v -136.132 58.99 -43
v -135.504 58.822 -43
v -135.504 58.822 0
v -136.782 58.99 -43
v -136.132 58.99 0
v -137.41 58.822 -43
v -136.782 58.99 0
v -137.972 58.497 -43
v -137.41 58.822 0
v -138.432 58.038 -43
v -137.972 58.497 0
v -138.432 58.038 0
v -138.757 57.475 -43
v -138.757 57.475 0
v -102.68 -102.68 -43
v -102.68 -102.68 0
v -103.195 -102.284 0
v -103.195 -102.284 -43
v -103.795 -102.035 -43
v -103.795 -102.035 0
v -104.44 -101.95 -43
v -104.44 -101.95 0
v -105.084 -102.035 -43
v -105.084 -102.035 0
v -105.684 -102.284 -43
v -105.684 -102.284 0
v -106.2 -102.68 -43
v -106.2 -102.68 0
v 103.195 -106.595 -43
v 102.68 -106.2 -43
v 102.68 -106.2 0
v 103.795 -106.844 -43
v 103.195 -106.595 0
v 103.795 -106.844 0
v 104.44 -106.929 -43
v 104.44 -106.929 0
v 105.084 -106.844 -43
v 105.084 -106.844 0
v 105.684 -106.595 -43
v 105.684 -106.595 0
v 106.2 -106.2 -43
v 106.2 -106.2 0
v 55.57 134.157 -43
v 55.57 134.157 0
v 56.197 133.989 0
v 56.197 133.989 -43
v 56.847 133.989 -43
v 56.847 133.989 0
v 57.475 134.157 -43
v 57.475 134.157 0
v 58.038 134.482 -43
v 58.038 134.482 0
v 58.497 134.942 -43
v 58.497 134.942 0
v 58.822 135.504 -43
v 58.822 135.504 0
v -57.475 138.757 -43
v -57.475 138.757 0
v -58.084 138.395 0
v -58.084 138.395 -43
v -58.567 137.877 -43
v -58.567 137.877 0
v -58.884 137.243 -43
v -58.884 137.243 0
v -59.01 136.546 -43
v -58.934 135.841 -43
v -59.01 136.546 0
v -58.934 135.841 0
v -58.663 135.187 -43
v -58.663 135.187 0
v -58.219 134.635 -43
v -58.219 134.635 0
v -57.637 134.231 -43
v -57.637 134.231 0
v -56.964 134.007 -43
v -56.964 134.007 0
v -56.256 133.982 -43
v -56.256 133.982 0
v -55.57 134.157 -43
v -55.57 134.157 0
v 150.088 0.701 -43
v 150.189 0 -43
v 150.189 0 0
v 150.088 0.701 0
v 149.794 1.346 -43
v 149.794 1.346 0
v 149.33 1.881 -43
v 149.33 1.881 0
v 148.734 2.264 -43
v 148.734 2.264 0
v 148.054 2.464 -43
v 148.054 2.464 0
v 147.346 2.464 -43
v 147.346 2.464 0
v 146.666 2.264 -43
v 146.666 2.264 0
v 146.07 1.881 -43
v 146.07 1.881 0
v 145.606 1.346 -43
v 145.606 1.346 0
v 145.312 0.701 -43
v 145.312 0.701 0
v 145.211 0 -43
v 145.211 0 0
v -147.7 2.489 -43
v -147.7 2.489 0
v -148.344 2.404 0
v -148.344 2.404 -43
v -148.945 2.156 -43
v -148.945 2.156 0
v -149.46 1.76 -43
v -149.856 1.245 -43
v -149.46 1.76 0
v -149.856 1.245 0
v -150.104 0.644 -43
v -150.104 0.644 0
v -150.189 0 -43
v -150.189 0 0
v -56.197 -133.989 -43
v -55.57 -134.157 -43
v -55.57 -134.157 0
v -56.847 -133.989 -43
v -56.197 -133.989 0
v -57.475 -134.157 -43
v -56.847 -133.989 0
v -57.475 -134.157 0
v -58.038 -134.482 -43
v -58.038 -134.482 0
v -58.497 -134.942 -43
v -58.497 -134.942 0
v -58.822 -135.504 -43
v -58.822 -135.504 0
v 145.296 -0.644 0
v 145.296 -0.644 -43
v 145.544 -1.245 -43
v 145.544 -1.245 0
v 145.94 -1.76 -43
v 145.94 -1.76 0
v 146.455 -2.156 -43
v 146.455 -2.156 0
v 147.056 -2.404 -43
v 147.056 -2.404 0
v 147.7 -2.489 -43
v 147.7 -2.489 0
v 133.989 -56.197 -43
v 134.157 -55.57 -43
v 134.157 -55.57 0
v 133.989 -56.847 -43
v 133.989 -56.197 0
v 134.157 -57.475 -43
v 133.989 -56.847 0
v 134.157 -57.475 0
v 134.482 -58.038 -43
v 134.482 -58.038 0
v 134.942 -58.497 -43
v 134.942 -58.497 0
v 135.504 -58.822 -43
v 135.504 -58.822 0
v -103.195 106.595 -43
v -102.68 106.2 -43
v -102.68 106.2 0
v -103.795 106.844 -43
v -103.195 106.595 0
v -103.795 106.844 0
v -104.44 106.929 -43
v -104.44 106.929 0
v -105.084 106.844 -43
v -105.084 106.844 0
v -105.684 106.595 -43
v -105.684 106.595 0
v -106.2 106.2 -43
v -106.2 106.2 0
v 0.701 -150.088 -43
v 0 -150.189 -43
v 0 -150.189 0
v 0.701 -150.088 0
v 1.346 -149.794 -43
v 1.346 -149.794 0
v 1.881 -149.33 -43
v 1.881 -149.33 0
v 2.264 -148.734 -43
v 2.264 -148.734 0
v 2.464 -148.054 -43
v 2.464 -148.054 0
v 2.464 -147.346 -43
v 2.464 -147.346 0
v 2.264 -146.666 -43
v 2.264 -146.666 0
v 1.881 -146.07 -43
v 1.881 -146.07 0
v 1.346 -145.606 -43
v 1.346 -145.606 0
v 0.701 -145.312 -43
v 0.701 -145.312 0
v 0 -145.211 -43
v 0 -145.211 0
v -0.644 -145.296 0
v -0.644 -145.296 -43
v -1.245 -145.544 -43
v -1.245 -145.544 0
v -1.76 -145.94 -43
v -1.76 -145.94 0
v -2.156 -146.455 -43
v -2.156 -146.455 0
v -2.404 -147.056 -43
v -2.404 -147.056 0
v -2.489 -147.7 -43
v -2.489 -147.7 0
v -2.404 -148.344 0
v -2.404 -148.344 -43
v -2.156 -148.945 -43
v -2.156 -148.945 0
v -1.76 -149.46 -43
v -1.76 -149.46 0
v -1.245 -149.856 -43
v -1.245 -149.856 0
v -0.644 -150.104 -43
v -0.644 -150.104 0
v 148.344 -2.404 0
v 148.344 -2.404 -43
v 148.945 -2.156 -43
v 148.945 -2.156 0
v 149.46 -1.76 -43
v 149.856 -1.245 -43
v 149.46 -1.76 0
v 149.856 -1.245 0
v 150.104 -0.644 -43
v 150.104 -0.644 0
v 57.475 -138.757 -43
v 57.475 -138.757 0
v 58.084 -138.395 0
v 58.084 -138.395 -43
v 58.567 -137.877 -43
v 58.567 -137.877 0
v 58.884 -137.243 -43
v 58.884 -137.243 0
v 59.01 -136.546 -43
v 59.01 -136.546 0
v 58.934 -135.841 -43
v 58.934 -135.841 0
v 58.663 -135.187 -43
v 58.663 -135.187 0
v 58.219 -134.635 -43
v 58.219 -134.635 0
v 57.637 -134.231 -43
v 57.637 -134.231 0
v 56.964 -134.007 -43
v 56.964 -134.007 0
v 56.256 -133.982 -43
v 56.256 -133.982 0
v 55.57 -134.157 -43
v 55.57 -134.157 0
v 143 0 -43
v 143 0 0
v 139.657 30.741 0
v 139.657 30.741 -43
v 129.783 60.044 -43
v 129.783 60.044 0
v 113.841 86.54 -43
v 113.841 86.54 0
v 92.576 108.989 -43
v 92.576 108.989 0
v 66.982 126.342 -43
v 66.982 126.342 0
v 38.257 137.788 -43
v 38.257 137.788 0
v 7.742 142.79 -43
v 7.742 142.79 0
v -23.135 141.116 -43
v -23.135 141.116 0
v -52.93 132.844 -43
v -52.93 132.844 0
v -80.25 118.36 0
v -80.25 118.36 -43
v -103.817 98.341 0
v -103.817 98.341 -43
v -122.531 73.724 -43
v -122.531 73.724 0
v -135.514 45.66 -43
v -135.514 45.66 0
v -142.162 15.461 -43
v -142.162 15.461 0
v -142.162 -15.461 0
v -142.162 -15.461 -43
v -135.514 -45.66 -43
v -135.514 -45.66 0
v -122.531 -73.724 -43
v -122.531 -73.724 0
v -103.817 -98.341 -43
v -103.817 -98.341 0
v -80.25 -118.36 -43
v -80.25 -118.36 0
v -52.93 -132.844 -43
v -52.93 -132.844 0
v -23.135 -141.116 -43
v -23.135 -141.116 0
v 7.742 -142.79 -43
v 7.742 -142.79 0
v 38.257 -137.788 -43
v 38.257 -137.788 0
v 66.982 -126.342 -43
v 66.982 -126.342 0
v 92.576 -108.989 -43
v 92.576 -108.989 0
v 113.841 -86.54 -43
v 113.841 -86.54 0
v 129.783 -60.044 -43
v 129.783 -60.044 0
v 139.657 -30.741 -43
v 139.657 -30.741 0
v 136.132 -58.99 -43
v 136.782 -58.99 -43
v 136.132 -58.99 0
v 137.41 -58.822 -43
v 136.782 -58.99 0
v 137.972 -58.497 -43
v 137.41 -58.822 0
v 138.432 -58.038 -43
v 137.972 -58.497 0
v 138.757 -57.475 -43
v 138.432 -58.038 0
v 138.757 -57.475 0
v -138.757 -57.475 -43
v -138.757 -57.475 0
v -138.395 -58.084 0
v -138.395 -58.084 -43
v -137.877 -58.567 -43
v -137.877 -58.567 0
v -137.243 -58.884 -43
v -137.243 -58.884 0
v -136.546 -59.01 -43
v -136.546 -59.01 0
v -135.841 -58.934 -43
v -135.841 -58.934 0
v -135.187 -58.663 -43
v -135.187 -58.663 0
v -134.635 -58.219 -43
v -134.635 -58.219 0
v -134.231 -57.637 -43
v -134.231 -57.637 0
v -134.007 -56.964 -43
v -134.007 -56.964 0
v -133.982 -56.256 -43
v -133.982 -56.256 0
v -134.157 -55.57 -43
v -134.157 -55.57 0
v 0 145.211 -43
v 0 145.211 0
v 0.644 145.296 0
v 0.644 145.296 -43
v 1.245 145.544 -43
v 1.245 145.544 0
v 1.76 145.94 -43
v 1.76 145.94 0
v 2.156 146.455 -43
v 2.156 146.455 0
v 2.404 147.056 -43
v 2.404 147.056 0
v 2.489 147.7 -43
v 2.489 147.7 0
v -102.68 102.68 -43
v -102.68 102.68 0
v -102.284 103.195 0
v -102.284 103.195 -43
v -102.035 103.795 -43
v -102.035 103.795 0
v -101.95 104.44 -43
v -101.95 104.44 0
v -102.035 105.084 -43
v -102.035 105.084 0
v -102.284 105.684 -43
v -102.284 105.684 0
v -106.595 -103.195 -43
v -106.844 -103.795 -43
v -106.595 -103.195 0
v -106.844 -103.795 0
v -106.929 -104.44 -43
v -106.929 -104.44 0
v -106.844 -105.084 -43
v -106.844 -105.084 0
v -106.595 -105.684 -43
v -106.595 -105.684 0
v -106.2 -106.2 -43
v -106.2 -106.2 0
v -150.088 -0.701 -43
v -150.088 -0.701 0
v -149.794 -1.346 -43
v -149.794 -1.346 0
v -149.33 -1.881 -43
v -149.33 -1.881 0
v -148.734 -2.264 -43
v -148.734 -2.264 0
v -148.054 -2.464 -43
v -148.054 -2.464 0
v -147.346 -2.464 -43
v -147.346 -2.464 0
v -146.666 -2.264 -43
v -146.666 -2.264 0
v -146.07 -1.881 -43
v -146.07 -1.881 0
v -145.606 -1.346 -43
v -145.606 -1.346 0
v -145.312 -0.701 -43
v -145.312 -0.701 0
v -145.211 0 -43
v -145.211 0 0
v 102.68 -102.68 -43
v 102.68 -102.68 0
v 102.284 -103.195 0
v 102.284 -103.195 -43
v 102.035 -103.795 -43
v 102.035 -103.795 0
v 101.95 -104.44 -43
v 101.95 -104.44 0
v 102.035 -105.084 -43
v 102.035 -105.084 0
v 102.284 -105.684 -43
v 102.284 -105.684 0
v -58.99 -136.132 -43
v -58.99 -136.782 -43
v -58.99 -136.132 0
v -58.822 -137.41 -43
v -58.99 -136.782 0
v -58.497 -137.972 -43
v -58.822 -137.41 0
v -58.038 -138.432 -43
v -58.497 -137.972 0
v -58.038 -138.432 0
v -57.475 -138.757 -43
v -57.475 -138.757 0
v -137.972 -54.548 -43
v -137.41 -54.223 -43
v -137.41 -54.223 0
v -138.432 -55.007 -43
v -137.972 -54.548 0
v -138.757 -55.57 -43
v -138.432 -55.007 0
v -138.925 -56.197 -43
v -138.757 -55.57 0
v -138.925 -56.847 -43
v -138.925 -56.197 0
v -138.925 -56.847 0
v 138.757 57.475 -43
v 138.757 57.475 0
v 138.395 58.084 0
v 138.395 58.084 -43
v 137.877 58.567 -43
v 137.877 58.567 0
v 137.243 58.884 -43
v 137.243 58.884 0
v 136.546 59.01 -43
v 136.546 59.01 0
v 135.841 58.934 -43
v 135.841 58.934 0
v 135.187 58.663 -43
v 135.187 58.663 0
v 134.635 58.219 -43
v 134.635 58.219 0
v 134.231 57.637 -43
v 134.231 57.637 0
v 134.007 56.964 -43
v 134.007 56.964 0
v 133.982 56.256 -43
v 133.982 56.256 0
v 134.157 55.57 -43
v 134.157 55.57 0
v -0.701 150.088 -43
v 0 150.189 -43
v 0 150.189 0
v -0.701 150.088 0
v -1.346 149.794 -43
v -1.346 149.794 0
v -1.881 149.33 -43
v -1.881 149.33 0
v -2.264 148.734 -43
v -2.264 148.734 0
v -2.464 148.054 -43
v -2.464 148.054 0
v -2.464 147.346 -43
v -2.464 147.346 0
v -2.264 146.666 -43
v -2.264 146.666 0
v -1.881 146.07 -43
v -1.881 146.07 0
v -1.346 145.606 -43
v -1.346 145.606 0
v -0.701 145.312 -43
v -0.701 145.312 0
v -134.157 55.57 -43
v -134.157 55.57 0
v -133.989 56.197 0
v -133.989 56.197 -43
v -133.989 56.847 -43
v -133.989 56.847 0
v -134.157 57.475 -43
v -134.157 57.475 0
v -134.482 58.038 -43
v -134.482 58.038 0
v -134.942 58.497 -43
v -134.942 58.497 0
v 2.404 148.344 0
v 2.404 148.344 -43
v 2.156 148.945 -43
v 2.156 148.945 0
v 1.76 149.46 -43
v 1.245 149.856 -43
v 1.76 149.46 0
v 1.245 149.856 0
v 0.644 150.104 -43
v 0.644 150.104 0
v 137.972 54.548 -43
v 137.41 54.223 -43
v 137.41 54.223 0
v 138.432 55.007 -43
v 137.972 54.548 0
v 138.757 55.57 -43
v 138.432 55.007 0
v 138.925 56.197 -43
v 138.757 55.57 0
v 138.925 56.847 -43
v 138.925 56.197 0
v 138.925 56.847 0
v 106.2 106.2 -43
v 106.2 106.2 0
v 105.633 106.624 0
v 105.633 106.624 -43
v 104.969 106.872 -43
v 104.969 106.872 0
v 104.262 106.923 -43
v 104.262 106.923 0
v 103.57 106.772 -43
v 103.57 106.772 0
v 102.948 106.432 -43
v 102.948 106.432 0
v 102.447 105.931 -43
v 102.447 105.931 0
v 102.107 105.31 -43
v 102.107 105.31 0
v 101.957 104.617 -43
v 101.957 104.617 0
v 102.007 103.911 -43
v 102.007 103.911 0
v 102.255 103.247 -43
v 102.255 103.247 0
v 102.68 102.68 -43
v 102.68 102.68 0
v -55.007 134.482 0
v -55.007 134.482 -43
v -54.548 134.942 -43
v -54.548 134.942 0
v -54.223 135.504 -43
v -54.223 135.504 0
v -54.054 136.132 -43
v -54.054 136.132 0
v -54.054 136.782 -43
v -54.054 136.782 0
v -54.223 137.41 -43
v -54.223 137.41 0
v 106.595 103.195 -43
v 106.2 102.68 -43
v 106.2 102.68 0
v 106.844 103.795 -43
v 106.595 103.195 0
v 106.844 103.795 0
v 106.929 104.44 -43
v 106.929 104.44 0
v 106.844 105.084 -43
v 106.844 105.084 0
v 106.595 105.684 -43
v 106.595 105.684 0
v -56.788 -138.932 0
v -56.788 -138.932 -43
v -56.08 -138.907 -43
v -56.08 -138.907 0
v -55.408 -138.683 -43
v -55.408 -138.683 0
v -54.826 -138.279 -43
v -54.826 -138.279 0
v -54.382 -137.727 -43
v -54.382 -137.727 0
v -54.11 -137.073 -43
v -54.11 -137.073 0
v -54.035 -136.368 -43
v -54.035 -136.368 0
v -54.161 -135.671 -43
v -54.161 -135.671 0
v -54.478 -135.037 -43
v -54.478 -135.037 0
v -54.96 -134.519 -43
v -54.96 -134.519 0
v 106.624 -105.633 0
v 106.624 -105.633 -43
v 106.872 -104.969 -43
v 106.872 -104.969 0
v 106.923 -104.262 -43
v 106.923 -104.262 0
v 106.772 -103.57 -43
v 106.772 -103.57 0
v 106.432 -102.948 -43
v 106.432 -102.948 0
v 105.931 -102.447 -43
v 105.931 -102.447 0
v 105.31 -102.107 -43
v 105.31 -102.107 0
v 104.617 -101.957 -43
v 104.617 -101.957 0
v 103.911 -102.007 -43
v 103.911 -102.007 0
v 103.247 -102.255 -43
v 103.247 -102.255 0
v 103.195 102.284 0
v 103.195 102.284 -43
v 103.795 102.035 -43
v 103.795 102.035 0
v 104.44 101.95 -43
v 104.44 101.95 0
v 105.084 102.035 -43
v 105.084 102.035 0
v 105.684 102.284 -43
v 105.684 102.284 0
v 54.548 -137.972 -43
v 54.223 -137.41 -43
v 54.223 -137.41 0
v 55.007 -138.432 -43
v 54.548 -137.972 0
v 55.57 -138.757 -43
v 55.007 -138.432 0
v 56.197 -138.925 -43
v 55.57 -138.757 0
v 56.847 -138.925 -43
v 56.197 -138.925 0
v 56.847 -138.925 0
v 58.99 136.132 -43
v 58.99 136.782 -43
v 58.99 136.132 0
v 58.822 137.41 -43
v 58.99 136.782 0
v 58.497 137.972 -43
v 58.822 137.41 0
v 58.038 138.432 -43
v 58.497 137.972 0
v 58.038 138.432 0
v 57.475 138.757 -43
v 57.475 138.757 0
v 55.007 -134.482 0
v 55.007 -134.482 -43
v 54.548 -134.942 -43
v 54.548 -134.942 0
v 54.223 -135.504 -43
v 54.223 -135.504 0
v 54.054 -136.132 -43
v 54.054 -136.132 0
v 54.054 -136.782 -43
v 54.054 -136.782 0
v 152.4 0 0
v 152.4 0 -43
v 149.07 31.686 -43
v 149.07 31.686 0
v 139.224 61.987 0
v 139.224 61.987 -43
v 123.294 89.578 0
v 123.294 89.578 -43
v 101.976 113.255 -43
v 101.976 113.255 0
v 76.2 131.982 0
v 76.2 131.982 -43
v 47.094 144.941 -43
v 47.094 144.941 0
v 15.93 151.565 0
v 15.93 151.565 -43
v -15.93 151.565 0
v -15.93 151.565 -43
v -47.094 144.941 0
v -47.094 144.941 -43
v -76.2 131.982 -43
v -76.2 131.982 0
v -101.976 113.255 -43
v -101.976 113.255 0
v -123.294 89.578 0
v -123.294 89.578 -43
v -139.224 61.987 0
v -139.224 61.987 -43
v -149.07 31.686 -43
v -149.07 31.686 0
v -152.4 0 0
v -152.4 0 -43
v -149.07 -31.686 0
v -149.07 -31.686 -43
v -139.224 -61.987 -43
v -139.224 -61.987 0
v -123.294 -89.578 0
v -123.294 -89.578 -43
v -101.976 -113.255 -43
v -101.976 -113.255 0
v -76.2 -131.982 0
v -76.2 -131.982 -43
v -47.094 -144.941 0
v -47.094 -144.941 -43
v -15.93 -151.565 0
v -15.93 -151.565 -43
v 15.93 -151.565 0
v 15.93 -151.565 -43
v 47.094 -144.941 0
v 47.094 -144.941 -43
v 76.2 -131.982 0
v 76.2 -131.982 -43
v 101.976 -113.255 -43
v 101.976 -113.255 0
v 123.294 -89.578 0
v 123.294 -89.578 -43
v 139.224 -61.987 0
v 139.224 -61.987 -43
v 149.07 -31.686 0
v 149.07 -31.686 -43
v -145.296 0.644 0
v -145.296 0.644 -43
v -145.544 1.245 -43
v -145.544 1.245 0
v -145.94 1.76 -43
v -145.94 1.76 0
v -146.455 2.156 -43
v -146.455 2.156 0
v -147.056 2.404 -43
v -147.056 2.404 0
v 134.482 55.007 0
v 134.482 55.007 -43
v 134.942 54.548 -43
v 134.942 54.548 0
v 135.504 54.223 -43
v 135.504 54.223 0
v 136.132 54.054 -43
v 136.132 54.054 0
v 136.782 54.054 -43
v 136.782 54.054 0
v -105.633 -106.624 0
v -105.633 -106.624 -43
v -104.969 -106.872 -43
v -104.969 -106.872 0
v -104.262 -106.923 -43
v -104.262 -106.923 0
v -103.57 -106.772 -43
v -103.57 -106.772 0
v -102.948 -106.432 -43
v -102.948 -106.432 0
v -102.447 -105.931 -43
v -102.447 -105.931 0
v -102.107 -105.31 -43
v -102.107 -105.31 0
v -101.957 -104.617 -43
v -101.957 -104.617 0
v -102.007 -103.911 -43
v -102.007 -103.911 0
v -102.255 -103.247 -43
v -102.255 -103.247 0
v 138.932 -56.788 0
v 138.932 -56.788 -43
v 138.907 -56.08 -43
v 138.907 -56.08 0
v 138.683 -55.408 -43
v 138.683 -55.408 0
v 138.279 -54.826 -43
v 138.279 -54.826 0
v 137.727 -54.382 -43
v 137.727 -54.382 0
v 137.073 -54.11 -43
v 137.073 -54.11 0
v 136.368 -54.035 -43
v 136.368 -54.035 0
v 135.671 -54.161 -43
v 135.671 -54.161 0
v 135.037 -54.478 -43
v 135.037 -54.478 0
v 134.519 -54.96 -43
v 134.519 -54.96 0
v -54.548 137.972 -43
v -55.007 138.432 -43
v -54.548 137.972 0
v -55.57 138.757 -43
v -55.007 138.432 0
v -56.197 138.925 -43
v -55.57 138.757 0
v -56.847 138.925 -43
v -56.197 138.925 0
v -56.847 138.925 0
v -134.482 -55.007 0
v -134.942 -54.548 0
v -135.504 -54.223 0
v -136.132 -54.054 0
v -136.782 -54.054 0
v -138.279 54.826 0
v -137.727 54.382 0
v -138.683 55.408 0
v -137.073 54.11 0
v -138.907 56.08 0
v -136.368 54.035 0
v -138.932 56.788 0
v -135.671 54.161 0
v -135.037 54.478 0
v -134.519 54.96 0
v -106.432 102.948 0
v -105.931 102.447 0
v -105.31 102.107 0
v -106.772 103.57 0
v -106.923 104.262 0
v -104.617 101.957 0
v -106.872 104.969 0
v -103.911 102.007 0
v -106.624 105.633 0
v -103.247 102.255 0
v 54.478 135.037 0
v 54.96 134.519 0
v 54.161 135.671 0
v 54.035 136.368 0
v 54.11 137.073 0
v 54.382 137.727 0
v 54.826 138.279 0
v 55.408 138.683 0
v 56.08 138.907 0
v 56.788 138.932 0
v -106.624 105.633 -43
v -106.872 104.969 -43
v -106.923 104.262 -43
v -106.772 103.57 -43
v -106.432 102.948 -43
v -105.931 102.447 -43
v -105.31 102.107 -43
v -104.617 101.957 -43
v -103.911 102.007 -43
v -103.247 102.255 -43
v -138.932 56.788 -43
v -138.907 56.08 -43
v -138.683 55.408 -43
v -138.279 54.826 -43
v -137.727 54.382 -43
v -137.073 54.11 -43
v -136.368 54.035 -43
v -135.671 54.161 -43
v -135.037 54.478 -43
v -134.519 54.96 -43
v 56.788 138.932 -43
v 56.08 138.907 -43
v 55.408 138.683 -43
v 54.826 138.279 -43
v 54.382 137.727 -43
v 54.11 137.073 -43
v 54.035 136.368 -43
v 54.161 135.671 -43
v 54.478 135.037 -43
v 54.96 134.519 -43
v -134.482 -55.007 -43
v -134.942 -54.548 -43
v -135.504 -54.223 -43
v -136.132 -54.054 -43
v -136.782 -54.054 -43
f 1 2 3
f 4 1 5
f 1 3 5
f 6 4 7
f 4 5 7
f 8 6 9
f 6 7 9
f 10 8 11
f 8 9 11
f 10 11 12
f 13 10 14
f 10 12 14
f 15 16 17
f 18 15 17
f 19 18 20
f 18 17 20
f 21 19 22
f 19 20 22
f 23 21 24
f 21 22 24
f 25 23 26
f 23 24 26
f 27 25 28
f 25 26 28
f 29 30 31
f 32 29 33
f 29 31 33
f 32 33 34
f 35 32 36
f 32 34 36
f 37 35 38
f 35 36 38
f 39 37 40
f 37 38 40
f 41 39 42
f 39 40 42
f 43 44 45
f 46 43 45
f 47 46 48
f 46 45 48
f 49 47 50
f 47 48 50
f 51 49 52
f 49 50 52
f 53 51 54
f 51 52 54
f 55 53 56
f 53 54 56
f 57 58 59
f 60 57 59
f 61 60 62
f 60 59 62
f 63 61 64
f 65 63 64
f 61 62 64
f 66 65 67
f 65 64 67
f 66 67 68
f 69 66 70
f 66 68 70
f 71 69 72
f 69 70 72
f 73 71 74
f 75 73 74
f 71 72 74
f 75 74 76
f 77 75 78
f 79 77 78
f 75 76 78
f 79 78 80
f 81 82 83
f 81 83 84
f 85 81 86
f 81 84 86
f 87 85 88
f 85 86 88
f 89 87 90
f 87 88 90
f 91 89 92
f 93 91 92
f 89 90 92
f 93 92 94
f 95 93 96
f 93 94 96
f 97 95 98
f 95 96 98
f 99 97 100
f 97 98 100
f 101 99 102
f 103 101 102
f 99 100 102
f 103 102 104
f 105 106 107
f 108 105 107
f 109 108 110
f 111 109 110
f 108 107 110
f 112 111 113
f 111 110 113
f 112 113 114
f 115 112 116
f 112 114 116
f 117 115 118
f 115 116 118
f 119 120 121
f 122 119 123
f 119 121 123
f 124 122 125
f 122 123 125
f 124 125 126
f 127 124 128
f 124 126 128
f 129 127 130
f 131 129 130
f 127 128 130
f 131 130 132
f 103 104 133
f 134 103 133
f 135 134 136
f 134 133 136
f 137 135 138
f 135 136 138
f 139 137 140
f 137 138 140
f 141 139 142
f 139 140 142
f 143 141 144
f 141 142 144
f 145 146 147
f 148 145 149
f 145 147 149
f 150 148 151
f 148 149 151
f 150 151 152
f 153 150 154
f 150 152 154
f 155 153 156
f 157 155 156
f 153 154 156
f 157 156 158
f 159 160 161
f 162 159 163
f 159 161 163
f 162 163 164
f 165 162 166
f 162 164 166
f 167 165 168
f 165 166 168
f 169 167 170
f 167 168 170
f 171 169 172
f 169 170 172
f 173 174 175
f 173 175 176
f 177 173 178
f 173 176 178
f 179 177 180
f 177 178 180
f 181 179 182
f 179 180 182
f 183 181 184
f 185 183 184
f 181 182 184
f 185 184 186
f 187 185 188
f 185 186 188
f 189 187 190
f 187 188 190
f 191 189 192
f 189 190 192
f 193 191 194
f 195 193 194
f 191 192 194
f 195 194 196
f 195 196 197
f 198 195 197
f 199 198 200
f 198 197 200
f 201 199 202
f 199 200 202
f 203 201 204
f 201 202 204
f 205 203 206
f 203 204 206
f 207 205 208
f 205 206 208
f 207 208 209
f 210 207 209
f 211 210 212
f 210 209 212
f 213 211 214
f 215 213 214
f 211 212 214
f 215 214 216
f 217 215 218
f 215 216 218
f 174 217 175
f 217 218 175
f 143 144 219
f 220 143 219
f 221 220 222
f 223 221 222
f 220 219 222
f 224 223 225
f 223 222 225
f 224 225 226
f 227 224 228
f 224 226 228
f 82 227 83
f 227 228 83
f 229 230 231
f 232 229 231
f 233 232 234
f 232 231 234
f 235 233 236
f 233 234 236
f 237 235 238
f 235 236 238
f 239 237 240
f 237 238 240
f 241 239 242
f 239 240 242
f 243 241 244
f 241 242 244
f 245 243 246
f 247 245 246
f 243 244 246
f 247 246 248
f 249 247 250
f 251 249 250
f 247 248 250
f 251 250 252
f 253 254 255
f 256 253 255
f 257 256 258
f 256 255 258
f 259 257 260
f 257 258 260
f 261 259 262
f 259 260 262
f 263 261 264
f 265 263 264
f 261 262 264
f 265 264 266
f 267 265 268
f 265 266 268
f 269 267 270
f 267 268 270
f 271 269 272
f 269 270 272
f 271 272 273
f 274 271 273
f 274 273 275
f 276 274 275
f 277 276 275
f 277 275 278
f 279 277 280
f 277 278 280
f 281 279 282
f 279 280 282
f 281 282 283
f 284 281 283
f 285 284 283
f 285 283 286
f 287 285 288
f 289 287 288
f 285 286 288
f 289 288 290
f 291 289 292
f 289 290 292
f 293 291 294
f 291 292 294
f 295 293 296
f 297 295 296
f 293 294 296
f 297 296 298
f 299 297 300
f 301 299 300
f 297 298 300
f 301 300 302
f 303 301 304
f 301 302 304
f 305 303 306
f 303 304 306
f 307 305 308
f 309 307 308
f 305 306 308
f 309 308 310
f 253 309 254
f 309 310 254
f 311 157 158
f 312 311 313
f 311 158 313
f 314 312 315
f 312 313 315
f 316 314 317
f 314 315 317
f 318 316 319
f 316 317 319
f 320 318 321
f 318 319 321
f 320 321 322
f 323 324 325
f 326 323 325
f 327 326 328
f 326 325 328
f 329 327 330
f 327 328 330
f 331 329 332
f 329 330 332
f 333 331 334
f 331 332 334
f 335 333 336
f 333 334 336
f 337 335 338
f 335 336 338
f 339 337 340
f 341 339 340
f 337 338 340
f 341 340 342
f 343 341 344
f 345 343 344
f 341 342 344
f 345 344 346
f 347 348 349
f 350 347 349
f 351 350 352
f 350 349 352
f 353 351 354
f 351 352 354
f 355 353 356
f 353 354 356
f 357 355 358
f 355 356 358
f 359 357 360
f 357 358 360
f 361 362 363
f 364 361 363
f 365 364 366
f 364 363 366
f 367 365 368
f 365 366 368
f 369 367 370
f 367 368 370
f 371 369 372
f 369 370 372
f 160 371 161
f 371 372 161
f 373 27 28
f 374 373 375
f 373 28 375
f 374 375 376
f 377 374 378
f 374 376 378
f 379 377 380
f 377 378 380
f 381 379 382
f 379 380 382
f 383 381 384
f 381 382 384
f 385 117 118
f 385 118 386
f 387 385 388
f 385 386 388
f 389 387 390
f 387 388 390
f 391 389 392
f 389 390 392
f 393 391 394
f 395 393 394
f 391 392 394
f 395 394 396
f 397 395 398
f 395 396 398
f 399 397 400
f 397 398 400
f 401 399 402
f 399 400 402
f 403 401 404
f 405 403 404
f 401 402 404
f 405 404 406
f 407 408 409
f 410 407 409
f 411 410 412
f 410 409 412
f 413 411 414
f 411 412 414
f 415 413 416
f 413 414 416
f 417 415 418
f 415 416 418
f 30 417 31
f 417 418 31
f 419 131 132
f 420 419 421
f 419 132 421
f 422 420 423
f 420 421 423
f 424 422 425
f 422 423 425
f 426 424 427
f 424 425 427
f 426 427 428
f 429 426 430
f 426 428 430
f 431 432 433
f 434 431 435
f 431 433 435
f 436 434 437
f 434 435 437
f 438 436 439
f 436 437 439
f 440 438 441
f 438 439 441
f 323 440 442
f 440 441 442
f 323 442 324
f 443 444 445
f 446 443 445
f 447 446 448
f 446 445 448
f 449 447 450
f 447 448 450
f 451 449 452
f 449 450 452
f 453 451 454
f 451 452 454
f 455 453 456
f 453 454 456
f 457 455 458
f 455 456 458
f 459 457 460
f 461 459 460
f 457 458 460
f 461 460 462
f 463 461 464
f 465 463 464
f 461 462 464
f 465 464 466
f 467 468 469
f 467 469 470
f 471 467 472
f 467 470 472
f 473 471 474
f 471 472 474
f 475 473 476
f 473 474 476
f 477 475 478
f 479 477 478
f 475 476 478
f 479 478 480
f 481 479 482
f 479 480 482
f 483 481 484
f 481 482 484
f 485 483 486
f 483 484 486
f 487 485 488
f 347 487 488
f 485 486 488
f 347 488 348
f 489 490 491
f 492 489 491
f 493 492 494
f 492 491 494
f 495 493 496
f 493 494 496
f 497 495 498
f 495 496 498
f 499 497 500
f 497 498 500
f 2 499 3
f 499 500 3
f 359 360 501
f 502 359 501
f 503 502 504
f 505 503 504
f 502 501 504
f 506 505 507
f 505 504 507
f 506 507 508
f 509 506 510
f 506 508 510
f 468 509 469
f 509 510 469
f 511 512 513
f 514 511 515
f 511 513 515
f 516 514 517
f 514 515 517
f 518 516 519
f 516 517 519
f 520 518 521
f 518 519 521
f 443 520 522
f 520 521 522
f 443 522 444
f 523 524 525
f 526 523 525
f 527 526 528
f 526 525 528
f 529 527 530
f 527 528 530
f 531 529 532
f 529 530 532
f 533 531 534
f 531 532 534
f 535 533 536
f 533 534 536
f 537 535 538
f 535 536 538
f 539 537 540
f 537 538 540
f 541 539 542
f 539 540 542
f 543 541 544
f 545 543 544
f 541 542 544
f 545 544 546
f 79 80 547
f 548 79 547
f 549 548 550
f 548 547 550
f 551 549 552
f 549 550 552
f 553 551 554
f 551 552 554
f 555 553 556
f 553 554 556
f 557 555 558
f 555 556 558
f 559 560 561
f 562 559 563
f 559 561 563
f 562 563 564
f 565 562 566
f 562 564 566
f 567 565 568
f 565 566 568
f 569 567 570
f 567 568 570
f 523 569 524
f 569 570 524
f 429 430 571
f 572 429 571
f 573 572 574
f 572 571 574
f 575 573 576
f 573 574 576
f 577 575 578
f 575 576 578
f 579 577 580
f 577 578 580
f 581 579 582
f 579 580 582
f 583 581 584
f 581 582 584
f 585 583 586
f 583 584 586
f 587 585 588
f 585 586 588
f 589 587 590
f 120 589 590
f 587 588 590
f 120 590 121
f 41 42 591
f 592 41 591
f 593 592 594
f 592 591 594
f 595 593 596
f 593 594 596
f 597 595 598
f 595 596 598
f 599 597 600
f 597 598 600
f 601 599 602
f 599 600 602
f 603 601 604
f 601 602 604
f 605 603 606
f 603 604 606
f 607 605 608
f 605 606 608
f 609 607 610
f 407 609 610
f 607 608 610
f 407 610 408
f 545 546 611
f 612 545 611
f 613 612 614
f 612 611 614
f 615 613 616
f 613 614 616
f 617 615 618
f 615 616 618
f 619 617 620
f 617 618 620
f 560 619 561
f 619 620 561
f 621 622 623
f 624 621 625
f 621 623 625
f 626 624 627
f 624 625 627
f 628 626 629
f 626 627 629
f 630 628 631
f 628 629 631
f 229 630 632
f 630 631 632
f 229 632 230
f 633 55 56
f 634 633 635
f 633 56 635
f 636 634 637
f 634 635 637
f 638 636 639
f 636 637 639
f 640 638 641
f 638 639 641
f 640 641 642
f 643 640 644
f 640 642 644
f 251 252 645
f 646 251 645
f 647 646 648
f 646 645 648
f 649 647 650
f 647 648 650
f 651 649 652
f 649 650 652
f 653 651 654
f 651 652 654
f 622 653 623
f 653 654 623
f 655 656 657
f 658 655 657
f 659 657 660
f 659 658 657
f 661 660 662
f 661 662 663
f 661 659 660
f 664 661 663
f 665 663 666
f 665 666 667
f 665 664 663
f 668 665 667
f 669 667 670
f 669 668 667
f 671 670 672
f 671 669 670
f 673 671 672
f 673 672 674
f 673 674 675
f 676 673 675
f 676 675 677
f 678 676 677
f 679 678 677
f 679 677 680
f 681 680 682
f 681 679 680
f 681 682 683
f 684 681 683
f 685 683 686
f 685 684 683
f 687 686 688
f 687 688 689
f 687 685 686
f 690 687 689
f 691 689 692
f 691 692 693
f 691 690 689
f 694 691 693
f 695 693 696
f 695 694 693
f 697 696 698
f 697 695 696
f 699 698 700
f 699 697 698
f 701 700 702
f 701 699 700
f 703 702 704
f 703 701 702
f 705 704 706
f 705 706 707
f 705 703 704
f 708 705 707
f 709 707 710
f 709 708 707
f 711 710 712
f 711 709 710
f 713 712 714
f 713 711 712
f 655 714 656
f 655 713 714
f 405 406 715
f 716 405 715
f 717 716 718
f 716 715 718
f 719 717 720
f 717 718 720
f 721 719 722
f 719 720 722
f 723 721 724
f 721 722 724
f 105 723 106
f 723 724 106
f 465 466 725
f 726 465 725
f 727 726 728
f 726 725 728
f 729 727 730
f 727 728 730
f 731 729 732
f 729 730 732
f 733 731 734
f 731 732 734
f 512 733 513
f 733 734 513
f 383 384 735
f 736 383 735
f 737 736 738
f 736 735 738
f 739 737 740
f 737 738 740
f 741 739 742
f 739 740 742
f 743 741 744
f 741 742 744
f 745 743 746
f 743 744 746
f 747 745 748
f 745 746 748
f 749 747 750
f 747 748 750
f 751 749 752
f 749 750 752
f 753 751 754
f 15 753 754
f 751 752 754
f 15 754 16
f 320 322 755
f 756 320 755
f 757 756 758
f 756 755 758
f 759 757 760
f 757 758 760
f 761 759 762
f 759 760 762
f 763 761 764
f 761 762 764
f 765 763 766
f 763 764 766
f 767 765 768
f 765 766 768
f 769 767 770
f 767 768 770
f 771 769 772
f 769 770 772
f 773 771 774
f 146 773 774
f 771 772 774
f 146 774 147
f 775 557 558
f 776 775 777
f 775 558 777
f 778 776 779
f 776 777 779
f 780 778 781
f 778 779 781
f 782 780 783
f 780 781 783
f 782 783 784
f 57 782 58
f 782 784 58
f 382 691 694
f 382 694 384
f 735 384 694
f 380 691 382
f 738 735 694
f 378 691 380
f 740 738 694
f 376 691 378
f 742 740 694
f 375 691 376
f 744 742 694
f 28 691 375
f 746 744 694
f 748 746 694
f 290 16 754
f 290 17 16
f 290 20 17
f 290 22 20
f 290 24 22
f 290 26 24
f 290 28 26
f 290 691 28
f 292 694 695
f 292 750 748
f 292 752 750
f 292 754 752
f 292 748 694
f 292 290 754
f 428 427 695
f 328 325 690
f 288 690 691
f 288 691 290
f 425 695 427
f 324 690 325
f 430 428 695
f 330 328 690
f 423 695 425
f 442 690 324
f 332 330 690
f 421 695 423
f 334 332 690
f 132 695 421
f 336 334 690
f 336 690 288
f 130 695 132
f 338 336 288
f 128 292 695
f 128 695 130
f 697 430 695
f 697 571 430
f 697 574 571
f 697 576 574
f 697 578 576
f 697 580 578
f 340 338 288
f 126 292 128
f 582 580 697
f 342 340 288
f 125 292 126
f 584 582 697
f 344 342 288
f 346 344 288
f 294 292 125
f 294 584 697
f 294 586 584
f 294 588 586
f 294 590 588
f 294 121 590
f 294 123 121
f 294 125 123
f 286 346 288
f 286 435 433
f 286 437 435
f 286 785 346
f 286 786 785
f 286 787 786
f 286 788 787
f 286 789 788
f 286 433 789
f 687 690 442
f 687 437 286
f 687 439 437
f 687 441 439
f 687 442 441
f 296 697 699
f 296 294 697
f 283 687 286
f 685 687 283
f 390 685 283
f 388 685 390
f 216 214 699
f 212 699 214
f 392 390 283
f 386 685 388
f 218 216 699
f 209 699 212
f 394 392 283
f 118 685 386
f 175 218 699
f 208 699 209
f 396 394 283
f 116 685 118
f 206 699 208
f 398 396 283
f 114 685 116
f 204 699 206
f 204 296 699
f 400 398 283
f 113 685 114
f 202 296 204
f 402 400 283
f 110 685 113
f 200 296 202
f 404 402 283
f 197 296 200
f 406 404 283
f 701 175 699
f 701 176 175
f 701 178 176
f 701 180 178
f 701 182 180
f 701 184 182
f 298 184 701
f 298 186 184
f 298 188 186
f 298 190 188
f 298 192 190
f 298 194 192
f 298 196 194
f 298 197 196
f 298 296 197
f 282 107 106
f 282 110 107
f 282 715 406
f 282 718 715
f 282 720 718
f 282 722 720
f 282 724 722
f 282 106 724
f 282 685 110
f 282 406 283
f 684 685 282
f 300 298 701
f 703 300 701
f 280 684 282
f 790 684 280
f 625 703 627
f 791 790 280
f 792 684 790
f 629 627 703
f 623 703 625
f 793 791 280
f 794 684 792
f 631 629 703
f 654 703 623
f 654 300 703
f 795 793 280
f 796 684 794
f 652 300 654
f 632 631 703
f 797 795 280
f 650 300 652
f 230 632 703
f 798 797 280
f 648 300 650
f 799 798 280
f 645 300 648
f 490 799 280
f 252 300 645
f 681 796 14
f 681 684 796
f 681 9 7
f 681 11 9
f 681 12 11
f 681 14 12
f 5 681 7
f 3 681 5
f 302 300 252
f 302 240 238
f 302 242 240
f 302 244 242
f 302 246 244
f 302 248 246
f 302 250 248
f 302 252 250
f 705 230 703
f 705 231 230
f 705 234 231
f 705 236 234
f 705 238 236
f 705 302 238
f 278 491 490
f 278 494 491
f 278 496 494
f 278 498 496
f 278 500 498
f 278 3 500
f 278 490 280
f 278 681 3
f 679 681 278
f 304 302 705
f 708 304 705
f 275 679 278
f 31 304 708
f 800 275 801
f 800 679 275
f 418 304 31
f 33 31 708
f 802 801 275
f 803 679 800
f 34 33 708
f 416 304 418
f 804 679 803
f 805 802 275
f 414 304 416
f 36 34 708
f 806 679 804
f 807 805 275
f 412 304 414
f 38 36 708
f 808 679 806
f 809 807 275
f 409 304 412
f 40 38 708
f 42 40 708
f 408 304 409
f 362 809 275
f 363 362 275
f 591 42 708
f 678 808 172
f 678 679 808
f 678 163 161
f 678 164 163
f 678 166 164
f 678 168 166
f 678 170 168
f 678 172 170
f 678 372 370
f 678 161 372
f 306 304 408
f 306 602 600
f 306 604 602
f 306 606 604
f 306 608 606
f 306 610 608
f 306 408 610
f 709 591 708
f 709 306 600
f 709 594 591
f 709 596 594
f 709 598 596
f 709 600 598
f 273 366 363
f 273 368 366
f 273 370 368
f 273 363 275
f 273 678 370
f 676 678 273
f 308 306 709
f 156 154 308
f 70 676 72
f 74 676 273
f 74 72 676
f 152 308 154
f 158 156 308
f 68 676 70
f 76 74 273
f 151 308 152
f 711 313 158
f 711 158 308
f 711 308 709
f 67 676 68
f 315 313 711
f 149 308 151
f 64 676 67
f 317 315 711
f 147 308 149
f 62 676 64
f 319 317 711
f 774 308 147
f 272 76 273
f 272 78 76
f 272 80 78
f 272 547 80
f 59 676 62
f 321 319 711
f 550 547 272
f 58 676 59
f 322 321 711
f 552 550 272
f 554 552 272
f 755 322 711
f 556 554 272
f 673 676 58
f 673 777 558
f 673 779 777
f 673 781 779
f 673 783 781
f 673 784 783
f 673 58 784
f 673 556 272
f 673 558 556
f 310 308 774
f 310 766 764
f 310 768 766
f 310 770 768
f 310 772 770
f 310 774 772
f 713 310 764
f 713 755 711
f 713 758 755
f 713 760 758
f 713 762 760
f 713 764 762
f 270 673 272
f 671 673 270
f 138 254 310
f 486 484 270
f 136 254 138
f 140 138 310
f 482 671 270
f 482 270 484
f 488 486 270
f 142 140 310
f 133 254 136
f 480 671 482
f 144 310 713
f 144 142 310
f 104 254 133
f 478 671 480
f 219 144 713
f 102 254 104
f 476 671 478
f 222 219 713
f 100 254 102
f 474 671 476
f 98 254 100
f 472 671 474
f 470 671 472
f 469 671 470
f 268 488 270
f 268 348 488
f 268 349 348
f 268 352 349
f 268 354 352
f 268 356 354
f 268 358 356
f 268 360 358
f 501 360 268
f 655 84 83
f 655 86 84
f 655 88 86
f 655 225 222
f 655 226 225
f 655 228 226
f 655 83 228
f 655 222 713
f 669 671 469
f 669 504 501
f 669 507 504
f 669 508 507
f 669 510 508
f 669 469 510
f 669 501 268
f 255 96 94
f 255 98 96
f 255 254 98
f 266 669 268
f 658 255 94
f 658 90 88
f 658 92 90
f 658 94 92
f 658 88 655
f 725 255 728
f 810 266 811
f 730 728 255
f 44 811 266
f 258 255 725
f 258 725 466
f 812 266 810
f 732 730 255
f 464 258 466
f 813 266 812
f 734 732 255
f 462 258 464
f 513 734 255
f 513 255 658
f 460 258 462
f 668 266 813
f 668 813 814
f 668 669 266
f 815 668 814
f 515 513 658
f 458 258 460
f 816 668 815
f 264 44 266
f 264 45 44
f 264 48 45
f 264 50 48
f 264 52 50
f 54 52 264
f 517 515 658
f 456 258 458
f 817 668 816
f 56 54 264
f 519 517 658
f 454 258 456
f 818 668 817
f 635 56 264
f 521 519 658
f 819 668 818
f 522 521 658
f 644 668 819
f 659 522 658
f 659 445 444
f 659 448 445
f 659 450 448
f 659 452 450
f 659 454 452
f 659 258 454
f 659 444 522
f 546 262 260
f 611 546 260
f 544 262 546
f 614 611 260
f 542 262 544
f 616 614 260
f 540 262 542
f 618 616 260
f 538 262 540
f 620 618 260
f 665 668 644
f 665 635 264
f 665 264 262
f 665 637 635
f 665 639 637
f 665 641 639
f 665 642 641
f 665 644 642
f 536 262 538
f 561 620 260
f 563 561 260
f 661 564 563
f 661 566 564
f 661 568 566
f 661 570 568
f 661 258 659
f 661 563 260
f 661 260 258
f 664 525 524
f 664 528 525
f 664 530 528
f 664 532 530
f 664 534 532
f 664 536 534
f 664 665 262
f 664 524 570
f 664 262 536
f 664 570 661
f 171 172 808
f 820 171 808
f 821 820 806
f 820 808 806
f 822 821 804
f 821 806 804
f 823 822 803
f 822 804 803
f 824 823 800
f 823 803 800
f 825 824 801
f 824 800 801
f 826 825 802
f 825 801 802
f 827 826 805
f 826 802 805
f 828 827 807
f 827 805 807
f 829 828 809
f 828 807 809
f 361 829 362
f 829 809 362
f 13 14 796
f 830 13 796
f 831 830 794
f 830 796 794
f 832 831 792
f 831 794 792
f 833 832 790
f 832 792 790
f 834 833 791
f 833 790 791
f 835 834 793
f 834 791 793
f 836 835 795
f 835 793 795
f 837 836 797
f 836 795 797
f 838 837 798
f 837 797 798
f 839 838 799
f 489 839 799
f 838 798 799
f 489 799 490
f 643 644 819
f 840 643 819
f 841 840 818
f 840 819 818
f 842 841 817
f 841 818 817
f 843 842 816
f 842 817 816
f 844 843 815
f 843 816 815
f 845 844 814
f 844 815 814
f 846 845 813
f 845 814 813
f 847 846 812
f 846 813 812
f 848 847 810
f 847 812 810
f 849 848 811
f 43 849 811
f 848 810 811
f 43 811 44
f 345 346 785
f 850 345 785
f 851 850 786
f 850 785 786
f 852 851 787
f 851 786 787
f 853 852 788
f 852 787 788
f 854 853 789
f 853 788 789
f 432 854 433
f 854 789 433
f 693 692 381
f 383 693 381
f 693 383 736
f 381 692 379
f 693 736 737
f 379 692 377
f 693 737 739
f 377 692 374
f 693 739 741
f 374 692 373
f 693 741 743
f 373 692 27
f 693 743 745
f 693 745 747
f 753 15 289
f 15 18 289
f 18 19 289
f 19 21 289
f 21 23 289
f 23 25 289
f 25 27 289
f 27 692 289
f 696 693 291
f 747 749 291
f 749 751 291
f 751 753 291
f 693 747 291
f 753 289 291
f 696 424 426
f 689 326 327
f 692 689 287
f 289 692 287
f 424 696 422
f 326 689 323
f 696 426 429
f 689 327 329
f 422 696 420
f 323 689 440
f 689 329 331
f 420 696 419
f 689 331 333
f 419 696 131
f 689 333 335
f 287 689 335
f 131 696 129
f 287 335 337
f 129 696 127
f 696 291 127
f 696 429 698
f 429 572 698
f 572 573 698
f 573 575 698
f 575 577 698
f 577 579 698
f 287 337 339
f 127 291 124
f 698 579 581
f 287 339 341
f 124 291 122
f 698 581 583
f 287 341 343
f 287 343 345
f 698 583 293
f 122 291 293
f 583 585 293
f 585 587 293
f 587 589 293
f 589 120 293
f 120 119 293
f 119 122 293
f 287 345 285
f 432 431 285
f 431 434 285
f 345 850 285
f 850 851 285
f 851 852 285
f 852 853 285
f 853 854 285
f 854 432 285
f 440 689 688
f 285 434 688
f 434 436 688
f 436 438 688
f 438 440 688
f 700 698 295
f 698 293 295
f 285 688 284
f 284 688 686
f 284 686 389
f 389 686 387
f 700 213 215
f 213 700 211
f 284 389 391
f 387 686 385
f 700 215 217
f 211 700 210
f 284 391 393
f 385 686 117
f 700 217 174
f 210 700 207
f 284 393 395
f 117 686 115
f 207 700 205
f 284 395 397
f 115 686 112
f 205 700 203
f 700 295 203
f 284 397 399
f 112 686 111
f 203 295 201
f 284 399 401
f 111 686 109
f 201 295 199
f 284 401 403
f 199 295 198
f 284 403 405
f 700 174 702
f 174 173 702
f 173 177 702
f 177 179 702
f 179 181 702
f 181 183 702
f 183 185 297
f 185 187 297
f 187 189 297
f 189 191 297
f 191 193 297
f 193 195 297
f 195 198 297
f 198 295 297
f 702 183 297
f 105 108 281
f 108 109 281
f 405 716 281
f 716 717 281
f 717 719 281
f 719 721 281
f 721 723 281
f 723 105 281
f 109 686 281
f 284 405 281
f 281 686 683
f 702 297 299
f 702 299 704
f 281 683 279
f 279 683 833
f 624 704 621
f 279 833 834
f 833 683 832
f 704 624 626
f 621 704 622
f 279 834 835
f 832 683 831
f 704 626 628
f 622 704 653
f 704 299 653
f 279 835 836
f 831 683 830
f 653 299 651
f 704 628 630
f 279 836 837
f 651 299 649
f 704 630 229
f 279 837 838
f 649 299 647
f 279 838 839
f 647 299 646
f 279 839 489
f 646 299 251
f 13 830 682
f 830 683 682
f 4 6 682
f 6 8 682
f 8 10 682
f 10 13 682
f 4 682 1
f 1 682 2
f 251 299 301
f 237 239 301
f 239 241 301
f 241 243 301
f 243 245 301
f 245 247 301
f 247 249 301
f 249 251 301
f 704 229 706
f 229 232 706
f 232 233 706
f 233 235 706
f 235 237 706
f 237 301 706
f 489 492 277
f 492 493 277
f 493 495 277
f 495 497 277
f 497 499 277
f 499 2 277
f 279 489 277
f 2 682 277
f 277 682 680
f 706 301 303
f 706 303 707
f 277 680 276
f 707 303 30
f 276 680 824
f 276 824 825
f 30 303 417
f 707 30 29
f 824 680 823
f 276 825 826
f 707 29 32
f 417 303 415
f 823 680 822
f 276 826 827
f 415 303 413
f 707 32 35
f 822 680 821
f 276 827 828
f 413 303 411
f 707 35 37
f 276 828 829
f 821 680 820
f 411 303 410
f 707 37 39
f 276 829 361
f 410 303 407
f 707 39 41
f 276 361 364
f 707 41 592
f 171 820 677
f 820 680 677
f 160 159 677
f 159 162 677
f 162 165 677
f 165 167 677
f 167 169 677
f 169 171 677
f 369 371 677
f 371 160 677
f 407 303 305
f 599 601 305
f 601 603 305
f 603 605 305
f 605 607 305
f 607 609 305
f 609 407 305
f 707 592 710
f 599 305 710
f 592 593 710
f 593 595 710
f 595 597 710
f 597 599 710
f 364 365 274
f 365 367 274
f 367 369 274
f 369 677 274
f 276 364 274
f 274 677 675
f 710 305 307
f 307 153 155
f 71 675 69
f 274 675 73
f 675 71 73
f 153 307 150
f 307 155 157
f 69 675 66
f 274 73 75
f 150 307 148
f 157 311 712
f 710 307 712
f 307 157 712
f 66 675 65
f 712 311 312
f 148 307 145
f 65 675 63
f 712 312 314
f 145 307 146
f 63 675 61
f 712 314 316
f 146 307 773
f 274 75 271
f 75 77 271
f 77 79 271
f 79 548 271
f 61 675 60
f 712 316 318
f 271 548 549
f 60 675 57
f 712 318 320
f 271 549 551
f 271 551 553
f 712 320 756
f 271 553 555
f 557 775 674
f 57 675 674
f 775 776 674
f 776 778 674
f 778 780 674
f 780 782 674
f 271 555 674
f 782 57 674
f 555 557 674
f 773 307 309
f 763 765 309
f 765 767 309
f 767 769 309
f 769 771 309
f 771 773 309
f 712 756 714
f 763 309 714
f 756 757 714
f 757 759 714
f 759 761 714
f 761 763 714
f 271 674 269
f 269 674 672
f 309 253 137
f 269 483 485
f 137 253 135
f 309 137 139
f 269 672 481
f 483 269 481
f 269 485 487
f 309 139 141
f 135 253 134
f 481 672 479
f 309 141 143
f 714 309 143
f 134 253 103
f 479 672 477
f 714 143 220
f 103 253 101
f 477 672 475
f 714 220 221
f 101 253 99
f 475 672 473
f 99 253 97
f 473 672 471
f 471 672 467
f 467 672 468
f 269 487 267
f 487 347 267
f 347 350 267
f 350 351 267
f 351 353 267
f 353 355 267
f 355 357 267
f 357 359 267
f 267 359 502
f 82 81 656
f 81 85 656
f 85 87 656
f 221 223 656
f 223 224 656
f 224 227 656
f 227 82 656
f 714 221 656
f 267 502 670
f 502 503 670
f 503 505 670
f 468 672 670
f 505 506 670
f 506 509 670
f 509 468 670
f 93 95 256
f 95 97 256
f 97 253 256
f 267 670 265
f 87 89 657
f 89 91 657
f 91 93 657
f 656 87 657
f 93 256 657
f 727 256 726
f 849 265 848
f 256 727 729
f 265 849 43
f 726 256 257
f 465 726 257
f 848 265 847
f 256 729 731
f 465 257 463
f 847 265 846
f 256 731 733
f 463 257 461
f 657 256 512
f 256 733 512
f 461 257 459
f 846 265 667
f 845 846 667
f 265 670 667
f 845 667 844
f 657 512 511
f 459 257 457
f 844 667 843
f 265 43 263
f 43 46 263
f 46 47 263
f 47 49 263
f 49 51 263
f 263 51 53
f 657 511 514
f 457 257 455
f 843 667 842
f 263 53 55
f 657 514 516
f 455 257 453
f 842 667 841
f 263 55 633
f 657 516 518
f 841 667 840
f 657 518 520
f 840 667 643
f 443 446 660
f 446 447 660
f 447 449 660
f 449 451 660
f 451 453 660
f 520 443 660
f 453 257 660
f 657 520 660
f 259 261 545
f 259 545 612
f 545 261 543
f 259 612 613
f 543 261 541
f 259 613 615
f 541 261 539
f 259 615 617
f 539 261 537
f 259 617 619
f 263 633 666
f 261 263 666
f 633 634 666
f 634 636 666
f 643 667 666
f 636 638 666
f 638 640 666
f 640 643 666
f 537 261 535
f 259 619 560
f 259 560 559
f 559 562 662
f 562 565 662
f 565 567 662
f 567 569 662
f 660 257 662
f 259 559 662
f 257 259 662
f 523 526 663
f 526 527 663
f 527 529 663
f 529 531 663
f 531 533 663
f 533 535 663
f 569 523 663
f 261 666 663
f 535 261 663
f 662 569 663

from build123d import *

# Parameters (mm, degrees)
SKETCH1_R           = 152.4
SKETCH1_R_2         = 143
BOSS_EXTRUDE1_DEPTH = 43
SKETCH1_3_R         = 2.4892
CUT_EXTRUDE1_DEPTH  = 220.773792796
CIRPATTERN1_COUNT   = 16


with BuildPart() as part:
    # Sketch1 → Boss-Extrude1 (new body)
    with BuildSketch(Plane(origin=(0, 0, 0), x_dir=(0, 1, 0), z_dir=(0, 0, 1))):
        Circle(SKETCH1_R)
        Circle(SKETCH1_R_2, mode=Mode.SUBTRACT)
    extrude(amount=-BOSS_EXTRUDE1_DEPTH)

    # Sketch1<3> → Cut-Extrude1 (cut, through all)
    with BuildSketch(Plane(origin=(0, 0, 0), x_dir=(0, 1, 0), z_dir=(0, 0, 1))):
        with Locations((0, 147.7)):
            Circle(SKETCH1_3_R)
    cut_extrude1 = extrude(amount=-CUT_EXTRUDE1_DEPTH, mode=Mode.SUBTRACT)

    # CirPattern1: Cut-Extrude1 ×16 about axis
    cirpattern1_axis = Axis((0, 0, -43), (0, 0, 1))
    for i in range(1, CIRPATTERN1_COUNT):
        add(cut_extrude1.rotate(cirpattern1_axis, i * 360 / CIRPATTERN1_COUNT), mode=Mode.SUBTRACT)


solid = part.part
